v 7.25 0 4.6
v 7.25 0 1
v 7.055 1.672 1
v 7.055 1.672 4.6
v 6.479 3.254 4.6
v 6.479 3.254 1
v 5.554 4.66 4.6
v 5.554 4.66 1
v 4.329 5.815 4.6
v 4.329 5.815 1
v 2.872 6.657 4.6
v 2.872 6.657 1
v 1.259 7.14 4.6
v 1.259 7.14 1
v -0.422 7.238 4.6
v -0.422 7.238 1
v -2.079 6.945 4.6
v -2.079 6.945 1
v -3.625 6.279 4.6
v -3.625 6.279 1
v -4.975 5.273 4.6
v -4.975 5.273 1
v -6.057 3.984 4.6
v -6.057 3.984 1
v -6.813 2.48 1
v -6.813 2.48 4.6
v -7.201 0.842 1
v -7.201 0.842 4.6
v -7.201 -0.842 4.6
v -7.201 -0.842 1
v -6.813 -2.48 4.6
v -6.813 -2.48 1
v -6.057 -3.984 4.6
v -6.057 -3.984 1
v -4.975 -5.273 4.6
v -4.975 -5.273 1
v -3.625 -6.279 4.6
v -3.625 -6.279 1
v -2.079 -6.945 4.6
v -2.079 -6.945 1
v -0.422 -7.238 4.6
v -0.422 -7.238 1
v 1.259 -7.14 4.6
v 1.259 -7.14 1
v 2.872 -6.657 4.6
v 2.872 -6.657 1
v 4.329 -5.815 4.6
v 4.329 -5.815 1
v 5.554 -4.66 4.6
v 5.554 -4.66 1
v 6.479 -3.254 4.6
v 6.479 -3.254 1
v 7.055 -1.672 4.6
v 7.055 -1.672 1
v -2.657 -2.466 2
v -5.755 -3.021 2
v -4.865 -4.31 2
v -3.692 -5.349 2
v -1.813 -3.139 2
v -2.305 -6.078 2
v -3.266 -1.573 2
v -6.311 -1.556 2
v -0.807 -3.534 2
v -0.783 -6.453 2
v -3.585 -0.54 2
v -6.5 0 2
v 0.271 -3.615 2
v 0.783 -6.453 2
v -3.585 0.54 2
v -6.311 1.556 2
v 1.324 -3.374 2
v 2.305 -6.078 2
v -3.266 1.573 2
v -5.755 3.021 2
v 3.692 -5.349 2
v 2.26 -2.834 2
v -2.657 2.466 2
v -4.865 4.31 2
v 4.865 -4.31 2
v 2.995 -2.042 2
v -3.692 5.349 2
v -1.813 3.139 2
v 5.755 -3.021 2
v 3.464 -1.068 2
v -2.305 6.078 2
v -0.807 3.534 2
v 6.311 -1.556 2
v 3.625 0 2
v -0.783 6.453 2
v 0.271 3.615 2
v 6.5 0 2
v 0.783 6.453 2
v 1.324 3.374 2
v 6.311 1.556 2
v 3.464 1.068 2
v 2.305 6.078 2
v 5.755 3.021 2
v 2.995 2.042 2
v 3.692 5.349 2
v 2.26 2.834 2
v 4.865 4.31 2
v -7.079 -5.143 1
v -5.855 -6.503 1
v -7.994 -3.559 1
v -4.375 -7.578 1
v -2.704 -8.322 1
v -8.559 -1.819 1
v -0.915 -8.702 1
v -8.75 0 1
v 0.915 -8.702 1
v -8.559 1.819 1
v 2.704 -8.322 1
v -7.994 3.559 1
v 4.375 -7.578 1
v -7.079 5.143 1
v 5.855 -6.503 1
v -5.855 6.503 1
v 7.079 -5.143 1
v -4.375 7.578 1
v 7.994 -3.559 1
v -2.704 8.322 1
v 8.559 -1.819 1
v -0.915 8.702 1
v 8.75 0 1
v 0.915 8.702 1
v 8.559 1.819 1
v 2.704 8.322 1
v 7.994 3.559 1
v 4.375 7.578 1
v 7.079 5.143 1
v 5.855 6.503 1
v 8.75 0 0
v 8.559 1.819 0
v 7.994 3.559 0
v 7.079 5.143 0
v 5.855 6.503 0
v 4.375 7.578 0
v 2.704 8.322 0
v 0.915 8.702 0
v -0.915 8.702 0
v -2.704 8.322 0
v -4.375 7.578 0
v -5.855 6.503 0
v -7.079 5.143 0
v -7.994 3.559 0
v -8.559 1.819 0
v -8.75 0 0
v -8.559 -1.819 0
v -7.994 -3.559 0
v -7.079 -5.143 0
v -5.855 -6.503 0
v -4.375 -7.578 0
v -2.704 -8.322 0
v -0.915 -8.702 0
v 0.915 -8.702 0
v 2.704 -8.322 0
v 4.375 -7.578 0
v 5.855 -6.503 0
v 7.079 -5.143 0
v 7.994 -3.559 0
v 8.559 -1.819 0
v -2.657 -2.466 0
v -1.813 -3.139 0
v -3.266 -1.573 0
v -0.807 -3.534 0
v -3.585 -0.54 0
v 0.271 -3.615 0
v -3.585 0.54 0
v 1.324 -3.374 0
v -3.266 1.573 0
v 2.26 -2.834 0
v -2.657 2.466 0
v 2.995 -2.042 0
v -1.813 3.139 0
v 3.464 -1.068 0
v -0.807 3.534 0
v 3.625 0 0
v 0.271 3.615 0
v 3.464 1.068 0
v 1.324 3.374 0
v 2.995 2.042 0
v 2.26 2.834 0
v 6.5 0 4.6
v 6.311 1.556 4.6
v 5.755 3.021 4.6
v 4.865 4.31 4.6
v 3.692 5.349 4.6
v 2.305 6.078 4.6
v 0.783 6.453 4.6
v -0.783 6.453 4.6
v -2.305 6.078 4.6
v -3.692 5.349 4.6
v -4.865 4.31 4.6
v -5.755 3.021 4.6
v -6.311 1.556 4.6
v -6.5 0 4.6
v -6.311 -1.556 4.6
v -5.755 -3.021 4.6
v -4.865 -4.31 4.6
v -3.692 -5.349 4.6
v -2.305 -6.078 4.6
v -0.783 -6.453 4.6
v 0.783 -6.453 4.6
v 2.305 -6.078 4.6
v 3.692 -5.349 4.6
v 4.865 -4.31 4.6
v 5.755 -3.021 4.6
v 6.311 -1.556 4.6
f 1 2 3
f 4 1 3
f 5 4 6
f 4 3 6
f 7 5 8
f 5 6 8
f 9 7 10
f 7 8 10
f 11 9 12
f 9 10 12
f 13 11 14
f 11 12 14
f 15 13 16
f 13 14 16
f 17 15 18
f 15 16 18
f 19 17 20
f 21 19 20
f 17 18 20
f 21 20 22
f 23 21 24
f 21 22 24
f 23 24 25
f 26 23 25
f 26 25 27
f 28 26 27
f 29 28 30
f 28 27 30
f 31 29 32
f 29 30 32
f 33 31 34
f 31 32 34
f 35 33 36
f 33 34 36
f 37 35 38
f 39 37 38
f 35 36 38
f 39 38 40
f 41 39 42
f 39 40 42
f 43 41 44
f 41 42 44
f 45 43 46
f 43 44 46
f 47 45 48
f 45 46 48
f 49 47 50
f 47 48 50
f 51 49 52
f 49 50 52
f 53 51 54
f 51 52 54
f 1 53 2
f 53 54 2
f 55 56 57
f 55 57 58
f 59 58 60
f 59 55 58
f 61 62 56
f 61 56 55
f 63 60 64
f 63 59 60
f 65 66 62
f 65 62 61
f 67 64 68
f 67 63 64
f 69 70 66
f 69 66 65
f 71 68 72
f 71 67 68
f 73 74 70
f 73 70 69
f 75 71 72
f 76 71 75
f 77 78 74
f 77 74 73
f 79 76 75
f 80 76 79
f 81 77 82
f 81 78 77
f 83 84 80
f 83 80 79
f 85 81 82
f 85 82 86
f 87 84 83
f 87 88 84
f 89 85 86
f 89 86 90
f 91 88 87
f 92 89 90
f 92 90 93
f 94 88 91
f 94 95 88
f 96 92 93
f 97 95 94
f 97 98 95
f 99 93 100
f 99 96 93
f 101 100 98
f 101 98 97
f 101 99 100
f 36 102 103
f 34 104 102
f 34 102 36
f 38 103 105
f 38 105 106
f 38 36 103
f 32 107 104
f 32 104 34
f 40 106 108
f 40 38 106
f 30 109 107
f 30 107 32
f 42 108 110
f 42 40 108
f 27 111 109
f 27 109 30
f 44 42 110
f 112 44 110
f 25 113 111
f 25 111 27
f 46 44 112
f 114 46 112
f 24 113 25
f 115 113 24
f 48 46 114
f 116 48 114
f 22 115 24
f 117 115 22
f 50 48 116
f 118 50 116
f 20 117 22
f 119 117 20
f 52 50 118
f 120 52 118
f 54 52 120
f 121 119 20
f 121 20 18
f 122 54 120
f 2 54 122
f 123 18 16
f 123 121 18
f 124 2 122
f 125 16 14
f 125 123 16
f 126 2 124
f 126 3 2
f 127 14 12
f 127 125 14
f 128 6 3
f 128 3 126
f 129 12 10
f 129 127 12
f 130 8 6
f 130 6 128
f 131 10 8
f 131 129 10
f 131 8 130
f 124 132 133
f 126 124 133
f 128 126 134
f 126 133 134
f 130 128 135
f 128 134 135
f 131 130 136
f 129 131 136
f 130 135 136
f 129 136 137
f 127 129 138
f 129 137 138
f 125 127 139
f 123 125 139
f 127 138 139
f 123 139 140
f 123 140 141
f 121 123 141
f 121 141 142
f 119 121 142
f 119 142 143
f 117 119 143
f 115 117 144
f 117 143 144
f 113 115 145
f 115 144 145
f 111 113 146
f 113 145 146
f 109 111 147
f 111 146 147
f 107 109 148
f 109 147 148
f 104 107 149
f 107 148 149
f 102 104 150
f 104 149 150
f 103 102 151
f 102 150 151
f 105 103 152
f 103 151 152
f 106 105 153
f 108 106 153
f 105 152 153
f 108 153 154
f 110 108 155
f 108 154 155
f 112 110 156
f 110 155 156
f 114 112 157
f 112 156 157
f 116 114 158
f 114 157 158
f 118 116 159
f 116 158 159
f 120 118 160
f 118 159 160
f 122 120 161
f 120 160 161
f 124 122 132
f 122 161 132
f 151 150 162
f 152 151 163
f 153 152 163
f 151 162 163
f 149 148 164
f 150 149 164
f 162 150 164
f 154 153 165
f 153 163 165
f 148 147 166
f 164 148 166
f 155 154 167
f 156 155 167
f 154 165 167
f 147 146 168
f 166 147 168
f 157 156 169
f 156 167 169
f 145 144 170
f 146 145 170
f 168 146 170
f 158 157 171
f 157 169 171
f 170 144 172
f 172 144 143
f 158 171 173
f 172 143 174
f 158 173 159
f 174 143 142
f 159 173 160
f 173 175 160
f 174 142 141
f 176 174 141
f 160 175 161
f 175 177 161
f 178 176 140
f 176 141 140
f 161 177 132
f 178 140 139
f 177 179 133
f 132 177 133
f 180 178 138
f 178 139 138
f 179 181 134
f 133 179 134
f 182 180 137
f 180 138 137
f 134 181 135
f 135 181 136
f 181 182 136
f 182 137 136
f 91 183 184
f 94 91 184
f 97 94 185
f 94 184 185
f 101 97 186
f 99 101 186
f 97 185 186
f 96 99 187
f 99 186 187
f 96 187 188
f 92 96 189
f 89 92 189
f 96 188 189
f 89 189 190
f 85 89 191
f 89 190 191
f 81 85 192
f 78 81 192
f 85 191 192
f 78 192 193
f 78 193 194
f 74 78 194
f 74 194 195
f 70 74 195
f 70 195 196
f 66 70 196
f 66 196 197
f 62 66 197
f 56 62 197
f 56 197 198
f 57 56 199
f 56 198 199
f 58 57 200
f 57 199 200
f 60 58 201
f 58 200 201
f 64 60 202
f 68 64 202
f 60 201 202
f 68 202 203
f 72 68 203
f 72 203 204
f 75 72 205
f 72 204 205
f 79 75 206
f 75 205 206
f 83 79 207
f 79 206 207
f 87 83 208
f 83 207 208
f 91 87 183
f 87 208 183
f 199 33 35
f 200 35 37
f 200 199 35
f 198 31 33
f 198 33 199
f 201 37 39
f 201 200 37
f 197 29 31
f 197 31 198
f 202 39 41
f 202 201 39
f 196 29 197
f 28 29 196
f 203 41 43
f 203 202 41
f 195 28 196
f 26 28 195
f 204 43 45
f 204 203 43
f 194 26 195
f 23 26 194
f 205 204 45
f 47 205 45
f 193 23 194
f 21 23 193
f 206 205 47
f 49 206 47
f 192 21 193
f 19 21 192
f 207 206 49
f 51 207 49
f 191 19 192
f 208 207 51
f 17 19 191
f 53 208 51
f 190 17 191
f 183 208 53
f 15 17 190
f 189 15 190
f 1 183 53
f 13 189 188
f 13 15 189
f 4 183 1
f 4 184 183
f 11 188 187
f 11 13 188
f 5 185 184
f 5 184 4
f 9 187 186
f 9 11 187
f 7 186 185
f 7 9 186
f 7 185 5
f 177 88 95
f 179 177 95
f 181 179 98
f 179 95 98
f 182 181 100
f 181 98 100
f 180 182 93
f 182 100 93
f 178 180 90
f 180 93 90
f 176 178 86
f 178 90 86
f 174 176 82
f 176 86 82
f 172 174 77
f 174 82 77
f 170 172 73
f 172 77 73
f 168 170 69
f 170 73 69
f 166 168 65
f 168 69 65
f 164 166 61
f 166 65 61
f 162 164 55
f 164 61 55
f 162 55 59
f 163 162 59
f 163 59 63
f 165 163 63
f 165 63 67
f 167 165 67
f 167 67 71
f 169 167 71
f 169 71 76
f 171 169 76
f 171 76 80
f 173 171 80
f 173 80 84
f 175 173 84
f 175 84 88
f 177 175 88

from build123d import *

# Parameters (mm, degrees)
F0_R     = 8.75
F1_DEPTH = 1
F2_R     = 7.25
F3_DEPTH = 3.6
F4_R     = 6.5
F5_DEPTH = 2.6
F6_R     = 3.625
F7_DEPTH = 2.001


with BuildPart() as f1:
    # F0 (on Top) → F1 (new body)
    with BuildSketch(Plane.XY):
        Circle(F0_R)
    extrude(amount=F1_DEPTH)

    # F2 (on face) → F3 (join)
    with BuildSketch(Plane.XY.offset(1)):
        Circle(F2_R)
    extrude(amount=F3_DEPTH)

    # F4 (on face) → F5 (cut)
    with BuildSketch(Plane.XY.offset(4.6)):
        Circle(F4_R)
    extrude(amount=-F5_DEPTH, mode=Mode.SUBTRACT)

    # F6 (on face) → F7 (cut, through all)
    with BuildSketch(Plane.XY.offset(2)):
        Circle(F6_R)
    extrude(amount=-F7_DEPTH, mode=Mode.SUBTRACT)


solid = f1.part
